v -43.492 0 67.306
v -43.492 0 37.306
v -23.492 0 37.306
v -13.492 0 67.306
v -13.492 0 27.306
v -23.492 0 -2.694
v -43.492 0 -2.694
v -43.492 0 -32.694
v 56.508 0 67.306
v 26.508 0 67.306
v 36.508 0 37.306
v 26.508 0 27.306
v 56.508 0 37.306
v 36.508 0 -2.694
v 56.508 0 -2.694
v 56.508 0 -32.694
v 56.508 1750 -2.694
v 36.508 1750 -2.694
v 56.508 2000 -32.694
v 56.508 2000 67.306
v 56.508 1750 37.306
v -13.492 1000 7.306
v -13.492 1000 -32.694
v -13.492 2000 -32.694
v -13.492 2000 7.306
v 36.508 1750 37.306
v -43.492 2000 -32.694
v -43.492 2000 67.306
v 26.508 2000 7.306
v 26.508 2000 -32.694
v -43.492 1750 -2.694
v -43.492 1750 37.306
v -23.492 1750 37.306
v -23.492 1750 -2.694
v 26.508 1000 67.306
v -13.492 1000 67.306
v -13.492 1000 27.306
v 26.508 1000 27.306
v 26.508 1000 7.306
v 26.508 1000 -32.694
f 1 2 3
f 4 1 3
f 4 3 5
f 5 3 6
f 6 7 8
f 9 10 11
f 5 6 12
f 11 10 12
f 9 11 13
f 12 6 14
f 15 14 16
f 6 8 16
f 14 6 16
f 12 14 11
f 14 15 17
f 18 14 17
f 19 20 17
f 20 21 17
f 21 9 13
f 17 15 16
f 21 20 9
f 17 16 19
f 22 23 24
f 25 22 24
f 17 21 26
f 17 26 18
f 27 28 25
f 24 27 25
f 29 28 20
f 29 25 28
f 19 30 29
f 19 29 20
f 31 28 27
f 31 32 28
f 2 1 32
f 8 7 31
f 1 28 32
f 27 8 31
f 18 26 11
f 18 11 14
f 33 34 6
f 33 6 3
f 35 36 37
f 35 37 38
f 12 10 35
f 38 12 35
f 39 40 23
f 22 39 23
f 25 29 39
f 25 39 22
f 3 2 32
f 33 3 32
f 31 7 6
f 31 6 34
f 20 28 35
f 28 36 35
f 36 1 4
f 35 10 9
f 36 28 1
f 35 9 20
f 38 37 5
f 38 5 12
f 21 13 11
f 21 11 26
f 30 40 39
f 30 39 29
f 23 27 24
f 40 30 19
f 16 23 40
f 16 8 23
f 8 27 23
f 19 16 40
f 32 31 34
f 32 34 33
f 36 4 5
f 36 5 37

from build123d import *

# Parameters (mm, degrees)
SKETCH1_W           = 100
SKETCH1_H           = 100
BOSS_EXTRUDE1_DEPTH = 2000
SKETCH2_W           = 40
SKETCH2_H           = 1000
CUT_EXTRUDE1_DEPTH  = 40
SKETCH3_W           = 40
SKETCH3_H           = 1000
CUT_EXTRUDE2_DEPTH  = 40
SKETCH4_W           = 40
SKETCH4_H           = 1750
CUT_EXTRUDE3_DEPTH  = 20
SKETCH5_W           = 40
SKETCH5_H           = 1750
CUT_EXTRUDE4_DEPTH  = 20


with BuildPart() as part:
    # Sketch1 → Boss-Extrude1 (new body)
    with BuildSketch(Plane(origin=(0, 0, 0), x_dir=(1, 0, 0), z_dir=(0, 1, 0))):
        with Locations((6.50810977, -17.305559975)):
            Rectangle(SKETCH1_W, SKETCH1_H)
    extrude(amount=BOSS_EXTRUDE1_DEPTH)

    # Sketch2 → Cut-Extrude1 (cut)
    with BuildSketch(Plane.XY.offset(67.305559975)):
        with Locations((6.50810977, 500)):
            Rectangle(SKETCH2_W, SKETCH2_H)
    extrude(amount=-CUT_EXTRUDE1_DEPTH, mode=Mode.SUBTRACT)

    # Sketch3 → Cut-Extrude2 (cut)
    with BuildSketch(Plane(origin=(0, 0, -32.694440025), x_dir=(-1, 0, 0), z_dir=(0, 0, -1))):
        with Locations((-6.50810977, 1500)):
            Rectangle(SKETCH3_W, SKETCH3_H)
    extrude(amount=-CUT_EXTRUDE2_DEPTH, mode=Mode.SUBTRACT)

    # Sketch4 → Cut-Extrude3 (cut)
    with BuildSketch(Plane(origin=(56.50810977, 0, 0), x_dir=(0, 0, -1), z_dir=(1, 0, 0))):
        with Locations((-17.305559975, 875)):
            Rectangle(SKETCH4_W, SKETCH4_H)
    extrude(amount=-CUT_EXTRUDE3_DEPTH, mode=Mode.SUBTRACT)

    # Sketch5 → Cut-Extrude4 (cut)
    with BuildSketch(Plane.ZY.offset(43.49189023)):
        with Locations((17.305559975, 875)):
            Rectangle(SKETCH5_W, SKETCH5_H)
    extrude(amount=-CUT_EXTRUDE4_DEPTH, mode=Mode.SUBTRACT)


solid = part.part
